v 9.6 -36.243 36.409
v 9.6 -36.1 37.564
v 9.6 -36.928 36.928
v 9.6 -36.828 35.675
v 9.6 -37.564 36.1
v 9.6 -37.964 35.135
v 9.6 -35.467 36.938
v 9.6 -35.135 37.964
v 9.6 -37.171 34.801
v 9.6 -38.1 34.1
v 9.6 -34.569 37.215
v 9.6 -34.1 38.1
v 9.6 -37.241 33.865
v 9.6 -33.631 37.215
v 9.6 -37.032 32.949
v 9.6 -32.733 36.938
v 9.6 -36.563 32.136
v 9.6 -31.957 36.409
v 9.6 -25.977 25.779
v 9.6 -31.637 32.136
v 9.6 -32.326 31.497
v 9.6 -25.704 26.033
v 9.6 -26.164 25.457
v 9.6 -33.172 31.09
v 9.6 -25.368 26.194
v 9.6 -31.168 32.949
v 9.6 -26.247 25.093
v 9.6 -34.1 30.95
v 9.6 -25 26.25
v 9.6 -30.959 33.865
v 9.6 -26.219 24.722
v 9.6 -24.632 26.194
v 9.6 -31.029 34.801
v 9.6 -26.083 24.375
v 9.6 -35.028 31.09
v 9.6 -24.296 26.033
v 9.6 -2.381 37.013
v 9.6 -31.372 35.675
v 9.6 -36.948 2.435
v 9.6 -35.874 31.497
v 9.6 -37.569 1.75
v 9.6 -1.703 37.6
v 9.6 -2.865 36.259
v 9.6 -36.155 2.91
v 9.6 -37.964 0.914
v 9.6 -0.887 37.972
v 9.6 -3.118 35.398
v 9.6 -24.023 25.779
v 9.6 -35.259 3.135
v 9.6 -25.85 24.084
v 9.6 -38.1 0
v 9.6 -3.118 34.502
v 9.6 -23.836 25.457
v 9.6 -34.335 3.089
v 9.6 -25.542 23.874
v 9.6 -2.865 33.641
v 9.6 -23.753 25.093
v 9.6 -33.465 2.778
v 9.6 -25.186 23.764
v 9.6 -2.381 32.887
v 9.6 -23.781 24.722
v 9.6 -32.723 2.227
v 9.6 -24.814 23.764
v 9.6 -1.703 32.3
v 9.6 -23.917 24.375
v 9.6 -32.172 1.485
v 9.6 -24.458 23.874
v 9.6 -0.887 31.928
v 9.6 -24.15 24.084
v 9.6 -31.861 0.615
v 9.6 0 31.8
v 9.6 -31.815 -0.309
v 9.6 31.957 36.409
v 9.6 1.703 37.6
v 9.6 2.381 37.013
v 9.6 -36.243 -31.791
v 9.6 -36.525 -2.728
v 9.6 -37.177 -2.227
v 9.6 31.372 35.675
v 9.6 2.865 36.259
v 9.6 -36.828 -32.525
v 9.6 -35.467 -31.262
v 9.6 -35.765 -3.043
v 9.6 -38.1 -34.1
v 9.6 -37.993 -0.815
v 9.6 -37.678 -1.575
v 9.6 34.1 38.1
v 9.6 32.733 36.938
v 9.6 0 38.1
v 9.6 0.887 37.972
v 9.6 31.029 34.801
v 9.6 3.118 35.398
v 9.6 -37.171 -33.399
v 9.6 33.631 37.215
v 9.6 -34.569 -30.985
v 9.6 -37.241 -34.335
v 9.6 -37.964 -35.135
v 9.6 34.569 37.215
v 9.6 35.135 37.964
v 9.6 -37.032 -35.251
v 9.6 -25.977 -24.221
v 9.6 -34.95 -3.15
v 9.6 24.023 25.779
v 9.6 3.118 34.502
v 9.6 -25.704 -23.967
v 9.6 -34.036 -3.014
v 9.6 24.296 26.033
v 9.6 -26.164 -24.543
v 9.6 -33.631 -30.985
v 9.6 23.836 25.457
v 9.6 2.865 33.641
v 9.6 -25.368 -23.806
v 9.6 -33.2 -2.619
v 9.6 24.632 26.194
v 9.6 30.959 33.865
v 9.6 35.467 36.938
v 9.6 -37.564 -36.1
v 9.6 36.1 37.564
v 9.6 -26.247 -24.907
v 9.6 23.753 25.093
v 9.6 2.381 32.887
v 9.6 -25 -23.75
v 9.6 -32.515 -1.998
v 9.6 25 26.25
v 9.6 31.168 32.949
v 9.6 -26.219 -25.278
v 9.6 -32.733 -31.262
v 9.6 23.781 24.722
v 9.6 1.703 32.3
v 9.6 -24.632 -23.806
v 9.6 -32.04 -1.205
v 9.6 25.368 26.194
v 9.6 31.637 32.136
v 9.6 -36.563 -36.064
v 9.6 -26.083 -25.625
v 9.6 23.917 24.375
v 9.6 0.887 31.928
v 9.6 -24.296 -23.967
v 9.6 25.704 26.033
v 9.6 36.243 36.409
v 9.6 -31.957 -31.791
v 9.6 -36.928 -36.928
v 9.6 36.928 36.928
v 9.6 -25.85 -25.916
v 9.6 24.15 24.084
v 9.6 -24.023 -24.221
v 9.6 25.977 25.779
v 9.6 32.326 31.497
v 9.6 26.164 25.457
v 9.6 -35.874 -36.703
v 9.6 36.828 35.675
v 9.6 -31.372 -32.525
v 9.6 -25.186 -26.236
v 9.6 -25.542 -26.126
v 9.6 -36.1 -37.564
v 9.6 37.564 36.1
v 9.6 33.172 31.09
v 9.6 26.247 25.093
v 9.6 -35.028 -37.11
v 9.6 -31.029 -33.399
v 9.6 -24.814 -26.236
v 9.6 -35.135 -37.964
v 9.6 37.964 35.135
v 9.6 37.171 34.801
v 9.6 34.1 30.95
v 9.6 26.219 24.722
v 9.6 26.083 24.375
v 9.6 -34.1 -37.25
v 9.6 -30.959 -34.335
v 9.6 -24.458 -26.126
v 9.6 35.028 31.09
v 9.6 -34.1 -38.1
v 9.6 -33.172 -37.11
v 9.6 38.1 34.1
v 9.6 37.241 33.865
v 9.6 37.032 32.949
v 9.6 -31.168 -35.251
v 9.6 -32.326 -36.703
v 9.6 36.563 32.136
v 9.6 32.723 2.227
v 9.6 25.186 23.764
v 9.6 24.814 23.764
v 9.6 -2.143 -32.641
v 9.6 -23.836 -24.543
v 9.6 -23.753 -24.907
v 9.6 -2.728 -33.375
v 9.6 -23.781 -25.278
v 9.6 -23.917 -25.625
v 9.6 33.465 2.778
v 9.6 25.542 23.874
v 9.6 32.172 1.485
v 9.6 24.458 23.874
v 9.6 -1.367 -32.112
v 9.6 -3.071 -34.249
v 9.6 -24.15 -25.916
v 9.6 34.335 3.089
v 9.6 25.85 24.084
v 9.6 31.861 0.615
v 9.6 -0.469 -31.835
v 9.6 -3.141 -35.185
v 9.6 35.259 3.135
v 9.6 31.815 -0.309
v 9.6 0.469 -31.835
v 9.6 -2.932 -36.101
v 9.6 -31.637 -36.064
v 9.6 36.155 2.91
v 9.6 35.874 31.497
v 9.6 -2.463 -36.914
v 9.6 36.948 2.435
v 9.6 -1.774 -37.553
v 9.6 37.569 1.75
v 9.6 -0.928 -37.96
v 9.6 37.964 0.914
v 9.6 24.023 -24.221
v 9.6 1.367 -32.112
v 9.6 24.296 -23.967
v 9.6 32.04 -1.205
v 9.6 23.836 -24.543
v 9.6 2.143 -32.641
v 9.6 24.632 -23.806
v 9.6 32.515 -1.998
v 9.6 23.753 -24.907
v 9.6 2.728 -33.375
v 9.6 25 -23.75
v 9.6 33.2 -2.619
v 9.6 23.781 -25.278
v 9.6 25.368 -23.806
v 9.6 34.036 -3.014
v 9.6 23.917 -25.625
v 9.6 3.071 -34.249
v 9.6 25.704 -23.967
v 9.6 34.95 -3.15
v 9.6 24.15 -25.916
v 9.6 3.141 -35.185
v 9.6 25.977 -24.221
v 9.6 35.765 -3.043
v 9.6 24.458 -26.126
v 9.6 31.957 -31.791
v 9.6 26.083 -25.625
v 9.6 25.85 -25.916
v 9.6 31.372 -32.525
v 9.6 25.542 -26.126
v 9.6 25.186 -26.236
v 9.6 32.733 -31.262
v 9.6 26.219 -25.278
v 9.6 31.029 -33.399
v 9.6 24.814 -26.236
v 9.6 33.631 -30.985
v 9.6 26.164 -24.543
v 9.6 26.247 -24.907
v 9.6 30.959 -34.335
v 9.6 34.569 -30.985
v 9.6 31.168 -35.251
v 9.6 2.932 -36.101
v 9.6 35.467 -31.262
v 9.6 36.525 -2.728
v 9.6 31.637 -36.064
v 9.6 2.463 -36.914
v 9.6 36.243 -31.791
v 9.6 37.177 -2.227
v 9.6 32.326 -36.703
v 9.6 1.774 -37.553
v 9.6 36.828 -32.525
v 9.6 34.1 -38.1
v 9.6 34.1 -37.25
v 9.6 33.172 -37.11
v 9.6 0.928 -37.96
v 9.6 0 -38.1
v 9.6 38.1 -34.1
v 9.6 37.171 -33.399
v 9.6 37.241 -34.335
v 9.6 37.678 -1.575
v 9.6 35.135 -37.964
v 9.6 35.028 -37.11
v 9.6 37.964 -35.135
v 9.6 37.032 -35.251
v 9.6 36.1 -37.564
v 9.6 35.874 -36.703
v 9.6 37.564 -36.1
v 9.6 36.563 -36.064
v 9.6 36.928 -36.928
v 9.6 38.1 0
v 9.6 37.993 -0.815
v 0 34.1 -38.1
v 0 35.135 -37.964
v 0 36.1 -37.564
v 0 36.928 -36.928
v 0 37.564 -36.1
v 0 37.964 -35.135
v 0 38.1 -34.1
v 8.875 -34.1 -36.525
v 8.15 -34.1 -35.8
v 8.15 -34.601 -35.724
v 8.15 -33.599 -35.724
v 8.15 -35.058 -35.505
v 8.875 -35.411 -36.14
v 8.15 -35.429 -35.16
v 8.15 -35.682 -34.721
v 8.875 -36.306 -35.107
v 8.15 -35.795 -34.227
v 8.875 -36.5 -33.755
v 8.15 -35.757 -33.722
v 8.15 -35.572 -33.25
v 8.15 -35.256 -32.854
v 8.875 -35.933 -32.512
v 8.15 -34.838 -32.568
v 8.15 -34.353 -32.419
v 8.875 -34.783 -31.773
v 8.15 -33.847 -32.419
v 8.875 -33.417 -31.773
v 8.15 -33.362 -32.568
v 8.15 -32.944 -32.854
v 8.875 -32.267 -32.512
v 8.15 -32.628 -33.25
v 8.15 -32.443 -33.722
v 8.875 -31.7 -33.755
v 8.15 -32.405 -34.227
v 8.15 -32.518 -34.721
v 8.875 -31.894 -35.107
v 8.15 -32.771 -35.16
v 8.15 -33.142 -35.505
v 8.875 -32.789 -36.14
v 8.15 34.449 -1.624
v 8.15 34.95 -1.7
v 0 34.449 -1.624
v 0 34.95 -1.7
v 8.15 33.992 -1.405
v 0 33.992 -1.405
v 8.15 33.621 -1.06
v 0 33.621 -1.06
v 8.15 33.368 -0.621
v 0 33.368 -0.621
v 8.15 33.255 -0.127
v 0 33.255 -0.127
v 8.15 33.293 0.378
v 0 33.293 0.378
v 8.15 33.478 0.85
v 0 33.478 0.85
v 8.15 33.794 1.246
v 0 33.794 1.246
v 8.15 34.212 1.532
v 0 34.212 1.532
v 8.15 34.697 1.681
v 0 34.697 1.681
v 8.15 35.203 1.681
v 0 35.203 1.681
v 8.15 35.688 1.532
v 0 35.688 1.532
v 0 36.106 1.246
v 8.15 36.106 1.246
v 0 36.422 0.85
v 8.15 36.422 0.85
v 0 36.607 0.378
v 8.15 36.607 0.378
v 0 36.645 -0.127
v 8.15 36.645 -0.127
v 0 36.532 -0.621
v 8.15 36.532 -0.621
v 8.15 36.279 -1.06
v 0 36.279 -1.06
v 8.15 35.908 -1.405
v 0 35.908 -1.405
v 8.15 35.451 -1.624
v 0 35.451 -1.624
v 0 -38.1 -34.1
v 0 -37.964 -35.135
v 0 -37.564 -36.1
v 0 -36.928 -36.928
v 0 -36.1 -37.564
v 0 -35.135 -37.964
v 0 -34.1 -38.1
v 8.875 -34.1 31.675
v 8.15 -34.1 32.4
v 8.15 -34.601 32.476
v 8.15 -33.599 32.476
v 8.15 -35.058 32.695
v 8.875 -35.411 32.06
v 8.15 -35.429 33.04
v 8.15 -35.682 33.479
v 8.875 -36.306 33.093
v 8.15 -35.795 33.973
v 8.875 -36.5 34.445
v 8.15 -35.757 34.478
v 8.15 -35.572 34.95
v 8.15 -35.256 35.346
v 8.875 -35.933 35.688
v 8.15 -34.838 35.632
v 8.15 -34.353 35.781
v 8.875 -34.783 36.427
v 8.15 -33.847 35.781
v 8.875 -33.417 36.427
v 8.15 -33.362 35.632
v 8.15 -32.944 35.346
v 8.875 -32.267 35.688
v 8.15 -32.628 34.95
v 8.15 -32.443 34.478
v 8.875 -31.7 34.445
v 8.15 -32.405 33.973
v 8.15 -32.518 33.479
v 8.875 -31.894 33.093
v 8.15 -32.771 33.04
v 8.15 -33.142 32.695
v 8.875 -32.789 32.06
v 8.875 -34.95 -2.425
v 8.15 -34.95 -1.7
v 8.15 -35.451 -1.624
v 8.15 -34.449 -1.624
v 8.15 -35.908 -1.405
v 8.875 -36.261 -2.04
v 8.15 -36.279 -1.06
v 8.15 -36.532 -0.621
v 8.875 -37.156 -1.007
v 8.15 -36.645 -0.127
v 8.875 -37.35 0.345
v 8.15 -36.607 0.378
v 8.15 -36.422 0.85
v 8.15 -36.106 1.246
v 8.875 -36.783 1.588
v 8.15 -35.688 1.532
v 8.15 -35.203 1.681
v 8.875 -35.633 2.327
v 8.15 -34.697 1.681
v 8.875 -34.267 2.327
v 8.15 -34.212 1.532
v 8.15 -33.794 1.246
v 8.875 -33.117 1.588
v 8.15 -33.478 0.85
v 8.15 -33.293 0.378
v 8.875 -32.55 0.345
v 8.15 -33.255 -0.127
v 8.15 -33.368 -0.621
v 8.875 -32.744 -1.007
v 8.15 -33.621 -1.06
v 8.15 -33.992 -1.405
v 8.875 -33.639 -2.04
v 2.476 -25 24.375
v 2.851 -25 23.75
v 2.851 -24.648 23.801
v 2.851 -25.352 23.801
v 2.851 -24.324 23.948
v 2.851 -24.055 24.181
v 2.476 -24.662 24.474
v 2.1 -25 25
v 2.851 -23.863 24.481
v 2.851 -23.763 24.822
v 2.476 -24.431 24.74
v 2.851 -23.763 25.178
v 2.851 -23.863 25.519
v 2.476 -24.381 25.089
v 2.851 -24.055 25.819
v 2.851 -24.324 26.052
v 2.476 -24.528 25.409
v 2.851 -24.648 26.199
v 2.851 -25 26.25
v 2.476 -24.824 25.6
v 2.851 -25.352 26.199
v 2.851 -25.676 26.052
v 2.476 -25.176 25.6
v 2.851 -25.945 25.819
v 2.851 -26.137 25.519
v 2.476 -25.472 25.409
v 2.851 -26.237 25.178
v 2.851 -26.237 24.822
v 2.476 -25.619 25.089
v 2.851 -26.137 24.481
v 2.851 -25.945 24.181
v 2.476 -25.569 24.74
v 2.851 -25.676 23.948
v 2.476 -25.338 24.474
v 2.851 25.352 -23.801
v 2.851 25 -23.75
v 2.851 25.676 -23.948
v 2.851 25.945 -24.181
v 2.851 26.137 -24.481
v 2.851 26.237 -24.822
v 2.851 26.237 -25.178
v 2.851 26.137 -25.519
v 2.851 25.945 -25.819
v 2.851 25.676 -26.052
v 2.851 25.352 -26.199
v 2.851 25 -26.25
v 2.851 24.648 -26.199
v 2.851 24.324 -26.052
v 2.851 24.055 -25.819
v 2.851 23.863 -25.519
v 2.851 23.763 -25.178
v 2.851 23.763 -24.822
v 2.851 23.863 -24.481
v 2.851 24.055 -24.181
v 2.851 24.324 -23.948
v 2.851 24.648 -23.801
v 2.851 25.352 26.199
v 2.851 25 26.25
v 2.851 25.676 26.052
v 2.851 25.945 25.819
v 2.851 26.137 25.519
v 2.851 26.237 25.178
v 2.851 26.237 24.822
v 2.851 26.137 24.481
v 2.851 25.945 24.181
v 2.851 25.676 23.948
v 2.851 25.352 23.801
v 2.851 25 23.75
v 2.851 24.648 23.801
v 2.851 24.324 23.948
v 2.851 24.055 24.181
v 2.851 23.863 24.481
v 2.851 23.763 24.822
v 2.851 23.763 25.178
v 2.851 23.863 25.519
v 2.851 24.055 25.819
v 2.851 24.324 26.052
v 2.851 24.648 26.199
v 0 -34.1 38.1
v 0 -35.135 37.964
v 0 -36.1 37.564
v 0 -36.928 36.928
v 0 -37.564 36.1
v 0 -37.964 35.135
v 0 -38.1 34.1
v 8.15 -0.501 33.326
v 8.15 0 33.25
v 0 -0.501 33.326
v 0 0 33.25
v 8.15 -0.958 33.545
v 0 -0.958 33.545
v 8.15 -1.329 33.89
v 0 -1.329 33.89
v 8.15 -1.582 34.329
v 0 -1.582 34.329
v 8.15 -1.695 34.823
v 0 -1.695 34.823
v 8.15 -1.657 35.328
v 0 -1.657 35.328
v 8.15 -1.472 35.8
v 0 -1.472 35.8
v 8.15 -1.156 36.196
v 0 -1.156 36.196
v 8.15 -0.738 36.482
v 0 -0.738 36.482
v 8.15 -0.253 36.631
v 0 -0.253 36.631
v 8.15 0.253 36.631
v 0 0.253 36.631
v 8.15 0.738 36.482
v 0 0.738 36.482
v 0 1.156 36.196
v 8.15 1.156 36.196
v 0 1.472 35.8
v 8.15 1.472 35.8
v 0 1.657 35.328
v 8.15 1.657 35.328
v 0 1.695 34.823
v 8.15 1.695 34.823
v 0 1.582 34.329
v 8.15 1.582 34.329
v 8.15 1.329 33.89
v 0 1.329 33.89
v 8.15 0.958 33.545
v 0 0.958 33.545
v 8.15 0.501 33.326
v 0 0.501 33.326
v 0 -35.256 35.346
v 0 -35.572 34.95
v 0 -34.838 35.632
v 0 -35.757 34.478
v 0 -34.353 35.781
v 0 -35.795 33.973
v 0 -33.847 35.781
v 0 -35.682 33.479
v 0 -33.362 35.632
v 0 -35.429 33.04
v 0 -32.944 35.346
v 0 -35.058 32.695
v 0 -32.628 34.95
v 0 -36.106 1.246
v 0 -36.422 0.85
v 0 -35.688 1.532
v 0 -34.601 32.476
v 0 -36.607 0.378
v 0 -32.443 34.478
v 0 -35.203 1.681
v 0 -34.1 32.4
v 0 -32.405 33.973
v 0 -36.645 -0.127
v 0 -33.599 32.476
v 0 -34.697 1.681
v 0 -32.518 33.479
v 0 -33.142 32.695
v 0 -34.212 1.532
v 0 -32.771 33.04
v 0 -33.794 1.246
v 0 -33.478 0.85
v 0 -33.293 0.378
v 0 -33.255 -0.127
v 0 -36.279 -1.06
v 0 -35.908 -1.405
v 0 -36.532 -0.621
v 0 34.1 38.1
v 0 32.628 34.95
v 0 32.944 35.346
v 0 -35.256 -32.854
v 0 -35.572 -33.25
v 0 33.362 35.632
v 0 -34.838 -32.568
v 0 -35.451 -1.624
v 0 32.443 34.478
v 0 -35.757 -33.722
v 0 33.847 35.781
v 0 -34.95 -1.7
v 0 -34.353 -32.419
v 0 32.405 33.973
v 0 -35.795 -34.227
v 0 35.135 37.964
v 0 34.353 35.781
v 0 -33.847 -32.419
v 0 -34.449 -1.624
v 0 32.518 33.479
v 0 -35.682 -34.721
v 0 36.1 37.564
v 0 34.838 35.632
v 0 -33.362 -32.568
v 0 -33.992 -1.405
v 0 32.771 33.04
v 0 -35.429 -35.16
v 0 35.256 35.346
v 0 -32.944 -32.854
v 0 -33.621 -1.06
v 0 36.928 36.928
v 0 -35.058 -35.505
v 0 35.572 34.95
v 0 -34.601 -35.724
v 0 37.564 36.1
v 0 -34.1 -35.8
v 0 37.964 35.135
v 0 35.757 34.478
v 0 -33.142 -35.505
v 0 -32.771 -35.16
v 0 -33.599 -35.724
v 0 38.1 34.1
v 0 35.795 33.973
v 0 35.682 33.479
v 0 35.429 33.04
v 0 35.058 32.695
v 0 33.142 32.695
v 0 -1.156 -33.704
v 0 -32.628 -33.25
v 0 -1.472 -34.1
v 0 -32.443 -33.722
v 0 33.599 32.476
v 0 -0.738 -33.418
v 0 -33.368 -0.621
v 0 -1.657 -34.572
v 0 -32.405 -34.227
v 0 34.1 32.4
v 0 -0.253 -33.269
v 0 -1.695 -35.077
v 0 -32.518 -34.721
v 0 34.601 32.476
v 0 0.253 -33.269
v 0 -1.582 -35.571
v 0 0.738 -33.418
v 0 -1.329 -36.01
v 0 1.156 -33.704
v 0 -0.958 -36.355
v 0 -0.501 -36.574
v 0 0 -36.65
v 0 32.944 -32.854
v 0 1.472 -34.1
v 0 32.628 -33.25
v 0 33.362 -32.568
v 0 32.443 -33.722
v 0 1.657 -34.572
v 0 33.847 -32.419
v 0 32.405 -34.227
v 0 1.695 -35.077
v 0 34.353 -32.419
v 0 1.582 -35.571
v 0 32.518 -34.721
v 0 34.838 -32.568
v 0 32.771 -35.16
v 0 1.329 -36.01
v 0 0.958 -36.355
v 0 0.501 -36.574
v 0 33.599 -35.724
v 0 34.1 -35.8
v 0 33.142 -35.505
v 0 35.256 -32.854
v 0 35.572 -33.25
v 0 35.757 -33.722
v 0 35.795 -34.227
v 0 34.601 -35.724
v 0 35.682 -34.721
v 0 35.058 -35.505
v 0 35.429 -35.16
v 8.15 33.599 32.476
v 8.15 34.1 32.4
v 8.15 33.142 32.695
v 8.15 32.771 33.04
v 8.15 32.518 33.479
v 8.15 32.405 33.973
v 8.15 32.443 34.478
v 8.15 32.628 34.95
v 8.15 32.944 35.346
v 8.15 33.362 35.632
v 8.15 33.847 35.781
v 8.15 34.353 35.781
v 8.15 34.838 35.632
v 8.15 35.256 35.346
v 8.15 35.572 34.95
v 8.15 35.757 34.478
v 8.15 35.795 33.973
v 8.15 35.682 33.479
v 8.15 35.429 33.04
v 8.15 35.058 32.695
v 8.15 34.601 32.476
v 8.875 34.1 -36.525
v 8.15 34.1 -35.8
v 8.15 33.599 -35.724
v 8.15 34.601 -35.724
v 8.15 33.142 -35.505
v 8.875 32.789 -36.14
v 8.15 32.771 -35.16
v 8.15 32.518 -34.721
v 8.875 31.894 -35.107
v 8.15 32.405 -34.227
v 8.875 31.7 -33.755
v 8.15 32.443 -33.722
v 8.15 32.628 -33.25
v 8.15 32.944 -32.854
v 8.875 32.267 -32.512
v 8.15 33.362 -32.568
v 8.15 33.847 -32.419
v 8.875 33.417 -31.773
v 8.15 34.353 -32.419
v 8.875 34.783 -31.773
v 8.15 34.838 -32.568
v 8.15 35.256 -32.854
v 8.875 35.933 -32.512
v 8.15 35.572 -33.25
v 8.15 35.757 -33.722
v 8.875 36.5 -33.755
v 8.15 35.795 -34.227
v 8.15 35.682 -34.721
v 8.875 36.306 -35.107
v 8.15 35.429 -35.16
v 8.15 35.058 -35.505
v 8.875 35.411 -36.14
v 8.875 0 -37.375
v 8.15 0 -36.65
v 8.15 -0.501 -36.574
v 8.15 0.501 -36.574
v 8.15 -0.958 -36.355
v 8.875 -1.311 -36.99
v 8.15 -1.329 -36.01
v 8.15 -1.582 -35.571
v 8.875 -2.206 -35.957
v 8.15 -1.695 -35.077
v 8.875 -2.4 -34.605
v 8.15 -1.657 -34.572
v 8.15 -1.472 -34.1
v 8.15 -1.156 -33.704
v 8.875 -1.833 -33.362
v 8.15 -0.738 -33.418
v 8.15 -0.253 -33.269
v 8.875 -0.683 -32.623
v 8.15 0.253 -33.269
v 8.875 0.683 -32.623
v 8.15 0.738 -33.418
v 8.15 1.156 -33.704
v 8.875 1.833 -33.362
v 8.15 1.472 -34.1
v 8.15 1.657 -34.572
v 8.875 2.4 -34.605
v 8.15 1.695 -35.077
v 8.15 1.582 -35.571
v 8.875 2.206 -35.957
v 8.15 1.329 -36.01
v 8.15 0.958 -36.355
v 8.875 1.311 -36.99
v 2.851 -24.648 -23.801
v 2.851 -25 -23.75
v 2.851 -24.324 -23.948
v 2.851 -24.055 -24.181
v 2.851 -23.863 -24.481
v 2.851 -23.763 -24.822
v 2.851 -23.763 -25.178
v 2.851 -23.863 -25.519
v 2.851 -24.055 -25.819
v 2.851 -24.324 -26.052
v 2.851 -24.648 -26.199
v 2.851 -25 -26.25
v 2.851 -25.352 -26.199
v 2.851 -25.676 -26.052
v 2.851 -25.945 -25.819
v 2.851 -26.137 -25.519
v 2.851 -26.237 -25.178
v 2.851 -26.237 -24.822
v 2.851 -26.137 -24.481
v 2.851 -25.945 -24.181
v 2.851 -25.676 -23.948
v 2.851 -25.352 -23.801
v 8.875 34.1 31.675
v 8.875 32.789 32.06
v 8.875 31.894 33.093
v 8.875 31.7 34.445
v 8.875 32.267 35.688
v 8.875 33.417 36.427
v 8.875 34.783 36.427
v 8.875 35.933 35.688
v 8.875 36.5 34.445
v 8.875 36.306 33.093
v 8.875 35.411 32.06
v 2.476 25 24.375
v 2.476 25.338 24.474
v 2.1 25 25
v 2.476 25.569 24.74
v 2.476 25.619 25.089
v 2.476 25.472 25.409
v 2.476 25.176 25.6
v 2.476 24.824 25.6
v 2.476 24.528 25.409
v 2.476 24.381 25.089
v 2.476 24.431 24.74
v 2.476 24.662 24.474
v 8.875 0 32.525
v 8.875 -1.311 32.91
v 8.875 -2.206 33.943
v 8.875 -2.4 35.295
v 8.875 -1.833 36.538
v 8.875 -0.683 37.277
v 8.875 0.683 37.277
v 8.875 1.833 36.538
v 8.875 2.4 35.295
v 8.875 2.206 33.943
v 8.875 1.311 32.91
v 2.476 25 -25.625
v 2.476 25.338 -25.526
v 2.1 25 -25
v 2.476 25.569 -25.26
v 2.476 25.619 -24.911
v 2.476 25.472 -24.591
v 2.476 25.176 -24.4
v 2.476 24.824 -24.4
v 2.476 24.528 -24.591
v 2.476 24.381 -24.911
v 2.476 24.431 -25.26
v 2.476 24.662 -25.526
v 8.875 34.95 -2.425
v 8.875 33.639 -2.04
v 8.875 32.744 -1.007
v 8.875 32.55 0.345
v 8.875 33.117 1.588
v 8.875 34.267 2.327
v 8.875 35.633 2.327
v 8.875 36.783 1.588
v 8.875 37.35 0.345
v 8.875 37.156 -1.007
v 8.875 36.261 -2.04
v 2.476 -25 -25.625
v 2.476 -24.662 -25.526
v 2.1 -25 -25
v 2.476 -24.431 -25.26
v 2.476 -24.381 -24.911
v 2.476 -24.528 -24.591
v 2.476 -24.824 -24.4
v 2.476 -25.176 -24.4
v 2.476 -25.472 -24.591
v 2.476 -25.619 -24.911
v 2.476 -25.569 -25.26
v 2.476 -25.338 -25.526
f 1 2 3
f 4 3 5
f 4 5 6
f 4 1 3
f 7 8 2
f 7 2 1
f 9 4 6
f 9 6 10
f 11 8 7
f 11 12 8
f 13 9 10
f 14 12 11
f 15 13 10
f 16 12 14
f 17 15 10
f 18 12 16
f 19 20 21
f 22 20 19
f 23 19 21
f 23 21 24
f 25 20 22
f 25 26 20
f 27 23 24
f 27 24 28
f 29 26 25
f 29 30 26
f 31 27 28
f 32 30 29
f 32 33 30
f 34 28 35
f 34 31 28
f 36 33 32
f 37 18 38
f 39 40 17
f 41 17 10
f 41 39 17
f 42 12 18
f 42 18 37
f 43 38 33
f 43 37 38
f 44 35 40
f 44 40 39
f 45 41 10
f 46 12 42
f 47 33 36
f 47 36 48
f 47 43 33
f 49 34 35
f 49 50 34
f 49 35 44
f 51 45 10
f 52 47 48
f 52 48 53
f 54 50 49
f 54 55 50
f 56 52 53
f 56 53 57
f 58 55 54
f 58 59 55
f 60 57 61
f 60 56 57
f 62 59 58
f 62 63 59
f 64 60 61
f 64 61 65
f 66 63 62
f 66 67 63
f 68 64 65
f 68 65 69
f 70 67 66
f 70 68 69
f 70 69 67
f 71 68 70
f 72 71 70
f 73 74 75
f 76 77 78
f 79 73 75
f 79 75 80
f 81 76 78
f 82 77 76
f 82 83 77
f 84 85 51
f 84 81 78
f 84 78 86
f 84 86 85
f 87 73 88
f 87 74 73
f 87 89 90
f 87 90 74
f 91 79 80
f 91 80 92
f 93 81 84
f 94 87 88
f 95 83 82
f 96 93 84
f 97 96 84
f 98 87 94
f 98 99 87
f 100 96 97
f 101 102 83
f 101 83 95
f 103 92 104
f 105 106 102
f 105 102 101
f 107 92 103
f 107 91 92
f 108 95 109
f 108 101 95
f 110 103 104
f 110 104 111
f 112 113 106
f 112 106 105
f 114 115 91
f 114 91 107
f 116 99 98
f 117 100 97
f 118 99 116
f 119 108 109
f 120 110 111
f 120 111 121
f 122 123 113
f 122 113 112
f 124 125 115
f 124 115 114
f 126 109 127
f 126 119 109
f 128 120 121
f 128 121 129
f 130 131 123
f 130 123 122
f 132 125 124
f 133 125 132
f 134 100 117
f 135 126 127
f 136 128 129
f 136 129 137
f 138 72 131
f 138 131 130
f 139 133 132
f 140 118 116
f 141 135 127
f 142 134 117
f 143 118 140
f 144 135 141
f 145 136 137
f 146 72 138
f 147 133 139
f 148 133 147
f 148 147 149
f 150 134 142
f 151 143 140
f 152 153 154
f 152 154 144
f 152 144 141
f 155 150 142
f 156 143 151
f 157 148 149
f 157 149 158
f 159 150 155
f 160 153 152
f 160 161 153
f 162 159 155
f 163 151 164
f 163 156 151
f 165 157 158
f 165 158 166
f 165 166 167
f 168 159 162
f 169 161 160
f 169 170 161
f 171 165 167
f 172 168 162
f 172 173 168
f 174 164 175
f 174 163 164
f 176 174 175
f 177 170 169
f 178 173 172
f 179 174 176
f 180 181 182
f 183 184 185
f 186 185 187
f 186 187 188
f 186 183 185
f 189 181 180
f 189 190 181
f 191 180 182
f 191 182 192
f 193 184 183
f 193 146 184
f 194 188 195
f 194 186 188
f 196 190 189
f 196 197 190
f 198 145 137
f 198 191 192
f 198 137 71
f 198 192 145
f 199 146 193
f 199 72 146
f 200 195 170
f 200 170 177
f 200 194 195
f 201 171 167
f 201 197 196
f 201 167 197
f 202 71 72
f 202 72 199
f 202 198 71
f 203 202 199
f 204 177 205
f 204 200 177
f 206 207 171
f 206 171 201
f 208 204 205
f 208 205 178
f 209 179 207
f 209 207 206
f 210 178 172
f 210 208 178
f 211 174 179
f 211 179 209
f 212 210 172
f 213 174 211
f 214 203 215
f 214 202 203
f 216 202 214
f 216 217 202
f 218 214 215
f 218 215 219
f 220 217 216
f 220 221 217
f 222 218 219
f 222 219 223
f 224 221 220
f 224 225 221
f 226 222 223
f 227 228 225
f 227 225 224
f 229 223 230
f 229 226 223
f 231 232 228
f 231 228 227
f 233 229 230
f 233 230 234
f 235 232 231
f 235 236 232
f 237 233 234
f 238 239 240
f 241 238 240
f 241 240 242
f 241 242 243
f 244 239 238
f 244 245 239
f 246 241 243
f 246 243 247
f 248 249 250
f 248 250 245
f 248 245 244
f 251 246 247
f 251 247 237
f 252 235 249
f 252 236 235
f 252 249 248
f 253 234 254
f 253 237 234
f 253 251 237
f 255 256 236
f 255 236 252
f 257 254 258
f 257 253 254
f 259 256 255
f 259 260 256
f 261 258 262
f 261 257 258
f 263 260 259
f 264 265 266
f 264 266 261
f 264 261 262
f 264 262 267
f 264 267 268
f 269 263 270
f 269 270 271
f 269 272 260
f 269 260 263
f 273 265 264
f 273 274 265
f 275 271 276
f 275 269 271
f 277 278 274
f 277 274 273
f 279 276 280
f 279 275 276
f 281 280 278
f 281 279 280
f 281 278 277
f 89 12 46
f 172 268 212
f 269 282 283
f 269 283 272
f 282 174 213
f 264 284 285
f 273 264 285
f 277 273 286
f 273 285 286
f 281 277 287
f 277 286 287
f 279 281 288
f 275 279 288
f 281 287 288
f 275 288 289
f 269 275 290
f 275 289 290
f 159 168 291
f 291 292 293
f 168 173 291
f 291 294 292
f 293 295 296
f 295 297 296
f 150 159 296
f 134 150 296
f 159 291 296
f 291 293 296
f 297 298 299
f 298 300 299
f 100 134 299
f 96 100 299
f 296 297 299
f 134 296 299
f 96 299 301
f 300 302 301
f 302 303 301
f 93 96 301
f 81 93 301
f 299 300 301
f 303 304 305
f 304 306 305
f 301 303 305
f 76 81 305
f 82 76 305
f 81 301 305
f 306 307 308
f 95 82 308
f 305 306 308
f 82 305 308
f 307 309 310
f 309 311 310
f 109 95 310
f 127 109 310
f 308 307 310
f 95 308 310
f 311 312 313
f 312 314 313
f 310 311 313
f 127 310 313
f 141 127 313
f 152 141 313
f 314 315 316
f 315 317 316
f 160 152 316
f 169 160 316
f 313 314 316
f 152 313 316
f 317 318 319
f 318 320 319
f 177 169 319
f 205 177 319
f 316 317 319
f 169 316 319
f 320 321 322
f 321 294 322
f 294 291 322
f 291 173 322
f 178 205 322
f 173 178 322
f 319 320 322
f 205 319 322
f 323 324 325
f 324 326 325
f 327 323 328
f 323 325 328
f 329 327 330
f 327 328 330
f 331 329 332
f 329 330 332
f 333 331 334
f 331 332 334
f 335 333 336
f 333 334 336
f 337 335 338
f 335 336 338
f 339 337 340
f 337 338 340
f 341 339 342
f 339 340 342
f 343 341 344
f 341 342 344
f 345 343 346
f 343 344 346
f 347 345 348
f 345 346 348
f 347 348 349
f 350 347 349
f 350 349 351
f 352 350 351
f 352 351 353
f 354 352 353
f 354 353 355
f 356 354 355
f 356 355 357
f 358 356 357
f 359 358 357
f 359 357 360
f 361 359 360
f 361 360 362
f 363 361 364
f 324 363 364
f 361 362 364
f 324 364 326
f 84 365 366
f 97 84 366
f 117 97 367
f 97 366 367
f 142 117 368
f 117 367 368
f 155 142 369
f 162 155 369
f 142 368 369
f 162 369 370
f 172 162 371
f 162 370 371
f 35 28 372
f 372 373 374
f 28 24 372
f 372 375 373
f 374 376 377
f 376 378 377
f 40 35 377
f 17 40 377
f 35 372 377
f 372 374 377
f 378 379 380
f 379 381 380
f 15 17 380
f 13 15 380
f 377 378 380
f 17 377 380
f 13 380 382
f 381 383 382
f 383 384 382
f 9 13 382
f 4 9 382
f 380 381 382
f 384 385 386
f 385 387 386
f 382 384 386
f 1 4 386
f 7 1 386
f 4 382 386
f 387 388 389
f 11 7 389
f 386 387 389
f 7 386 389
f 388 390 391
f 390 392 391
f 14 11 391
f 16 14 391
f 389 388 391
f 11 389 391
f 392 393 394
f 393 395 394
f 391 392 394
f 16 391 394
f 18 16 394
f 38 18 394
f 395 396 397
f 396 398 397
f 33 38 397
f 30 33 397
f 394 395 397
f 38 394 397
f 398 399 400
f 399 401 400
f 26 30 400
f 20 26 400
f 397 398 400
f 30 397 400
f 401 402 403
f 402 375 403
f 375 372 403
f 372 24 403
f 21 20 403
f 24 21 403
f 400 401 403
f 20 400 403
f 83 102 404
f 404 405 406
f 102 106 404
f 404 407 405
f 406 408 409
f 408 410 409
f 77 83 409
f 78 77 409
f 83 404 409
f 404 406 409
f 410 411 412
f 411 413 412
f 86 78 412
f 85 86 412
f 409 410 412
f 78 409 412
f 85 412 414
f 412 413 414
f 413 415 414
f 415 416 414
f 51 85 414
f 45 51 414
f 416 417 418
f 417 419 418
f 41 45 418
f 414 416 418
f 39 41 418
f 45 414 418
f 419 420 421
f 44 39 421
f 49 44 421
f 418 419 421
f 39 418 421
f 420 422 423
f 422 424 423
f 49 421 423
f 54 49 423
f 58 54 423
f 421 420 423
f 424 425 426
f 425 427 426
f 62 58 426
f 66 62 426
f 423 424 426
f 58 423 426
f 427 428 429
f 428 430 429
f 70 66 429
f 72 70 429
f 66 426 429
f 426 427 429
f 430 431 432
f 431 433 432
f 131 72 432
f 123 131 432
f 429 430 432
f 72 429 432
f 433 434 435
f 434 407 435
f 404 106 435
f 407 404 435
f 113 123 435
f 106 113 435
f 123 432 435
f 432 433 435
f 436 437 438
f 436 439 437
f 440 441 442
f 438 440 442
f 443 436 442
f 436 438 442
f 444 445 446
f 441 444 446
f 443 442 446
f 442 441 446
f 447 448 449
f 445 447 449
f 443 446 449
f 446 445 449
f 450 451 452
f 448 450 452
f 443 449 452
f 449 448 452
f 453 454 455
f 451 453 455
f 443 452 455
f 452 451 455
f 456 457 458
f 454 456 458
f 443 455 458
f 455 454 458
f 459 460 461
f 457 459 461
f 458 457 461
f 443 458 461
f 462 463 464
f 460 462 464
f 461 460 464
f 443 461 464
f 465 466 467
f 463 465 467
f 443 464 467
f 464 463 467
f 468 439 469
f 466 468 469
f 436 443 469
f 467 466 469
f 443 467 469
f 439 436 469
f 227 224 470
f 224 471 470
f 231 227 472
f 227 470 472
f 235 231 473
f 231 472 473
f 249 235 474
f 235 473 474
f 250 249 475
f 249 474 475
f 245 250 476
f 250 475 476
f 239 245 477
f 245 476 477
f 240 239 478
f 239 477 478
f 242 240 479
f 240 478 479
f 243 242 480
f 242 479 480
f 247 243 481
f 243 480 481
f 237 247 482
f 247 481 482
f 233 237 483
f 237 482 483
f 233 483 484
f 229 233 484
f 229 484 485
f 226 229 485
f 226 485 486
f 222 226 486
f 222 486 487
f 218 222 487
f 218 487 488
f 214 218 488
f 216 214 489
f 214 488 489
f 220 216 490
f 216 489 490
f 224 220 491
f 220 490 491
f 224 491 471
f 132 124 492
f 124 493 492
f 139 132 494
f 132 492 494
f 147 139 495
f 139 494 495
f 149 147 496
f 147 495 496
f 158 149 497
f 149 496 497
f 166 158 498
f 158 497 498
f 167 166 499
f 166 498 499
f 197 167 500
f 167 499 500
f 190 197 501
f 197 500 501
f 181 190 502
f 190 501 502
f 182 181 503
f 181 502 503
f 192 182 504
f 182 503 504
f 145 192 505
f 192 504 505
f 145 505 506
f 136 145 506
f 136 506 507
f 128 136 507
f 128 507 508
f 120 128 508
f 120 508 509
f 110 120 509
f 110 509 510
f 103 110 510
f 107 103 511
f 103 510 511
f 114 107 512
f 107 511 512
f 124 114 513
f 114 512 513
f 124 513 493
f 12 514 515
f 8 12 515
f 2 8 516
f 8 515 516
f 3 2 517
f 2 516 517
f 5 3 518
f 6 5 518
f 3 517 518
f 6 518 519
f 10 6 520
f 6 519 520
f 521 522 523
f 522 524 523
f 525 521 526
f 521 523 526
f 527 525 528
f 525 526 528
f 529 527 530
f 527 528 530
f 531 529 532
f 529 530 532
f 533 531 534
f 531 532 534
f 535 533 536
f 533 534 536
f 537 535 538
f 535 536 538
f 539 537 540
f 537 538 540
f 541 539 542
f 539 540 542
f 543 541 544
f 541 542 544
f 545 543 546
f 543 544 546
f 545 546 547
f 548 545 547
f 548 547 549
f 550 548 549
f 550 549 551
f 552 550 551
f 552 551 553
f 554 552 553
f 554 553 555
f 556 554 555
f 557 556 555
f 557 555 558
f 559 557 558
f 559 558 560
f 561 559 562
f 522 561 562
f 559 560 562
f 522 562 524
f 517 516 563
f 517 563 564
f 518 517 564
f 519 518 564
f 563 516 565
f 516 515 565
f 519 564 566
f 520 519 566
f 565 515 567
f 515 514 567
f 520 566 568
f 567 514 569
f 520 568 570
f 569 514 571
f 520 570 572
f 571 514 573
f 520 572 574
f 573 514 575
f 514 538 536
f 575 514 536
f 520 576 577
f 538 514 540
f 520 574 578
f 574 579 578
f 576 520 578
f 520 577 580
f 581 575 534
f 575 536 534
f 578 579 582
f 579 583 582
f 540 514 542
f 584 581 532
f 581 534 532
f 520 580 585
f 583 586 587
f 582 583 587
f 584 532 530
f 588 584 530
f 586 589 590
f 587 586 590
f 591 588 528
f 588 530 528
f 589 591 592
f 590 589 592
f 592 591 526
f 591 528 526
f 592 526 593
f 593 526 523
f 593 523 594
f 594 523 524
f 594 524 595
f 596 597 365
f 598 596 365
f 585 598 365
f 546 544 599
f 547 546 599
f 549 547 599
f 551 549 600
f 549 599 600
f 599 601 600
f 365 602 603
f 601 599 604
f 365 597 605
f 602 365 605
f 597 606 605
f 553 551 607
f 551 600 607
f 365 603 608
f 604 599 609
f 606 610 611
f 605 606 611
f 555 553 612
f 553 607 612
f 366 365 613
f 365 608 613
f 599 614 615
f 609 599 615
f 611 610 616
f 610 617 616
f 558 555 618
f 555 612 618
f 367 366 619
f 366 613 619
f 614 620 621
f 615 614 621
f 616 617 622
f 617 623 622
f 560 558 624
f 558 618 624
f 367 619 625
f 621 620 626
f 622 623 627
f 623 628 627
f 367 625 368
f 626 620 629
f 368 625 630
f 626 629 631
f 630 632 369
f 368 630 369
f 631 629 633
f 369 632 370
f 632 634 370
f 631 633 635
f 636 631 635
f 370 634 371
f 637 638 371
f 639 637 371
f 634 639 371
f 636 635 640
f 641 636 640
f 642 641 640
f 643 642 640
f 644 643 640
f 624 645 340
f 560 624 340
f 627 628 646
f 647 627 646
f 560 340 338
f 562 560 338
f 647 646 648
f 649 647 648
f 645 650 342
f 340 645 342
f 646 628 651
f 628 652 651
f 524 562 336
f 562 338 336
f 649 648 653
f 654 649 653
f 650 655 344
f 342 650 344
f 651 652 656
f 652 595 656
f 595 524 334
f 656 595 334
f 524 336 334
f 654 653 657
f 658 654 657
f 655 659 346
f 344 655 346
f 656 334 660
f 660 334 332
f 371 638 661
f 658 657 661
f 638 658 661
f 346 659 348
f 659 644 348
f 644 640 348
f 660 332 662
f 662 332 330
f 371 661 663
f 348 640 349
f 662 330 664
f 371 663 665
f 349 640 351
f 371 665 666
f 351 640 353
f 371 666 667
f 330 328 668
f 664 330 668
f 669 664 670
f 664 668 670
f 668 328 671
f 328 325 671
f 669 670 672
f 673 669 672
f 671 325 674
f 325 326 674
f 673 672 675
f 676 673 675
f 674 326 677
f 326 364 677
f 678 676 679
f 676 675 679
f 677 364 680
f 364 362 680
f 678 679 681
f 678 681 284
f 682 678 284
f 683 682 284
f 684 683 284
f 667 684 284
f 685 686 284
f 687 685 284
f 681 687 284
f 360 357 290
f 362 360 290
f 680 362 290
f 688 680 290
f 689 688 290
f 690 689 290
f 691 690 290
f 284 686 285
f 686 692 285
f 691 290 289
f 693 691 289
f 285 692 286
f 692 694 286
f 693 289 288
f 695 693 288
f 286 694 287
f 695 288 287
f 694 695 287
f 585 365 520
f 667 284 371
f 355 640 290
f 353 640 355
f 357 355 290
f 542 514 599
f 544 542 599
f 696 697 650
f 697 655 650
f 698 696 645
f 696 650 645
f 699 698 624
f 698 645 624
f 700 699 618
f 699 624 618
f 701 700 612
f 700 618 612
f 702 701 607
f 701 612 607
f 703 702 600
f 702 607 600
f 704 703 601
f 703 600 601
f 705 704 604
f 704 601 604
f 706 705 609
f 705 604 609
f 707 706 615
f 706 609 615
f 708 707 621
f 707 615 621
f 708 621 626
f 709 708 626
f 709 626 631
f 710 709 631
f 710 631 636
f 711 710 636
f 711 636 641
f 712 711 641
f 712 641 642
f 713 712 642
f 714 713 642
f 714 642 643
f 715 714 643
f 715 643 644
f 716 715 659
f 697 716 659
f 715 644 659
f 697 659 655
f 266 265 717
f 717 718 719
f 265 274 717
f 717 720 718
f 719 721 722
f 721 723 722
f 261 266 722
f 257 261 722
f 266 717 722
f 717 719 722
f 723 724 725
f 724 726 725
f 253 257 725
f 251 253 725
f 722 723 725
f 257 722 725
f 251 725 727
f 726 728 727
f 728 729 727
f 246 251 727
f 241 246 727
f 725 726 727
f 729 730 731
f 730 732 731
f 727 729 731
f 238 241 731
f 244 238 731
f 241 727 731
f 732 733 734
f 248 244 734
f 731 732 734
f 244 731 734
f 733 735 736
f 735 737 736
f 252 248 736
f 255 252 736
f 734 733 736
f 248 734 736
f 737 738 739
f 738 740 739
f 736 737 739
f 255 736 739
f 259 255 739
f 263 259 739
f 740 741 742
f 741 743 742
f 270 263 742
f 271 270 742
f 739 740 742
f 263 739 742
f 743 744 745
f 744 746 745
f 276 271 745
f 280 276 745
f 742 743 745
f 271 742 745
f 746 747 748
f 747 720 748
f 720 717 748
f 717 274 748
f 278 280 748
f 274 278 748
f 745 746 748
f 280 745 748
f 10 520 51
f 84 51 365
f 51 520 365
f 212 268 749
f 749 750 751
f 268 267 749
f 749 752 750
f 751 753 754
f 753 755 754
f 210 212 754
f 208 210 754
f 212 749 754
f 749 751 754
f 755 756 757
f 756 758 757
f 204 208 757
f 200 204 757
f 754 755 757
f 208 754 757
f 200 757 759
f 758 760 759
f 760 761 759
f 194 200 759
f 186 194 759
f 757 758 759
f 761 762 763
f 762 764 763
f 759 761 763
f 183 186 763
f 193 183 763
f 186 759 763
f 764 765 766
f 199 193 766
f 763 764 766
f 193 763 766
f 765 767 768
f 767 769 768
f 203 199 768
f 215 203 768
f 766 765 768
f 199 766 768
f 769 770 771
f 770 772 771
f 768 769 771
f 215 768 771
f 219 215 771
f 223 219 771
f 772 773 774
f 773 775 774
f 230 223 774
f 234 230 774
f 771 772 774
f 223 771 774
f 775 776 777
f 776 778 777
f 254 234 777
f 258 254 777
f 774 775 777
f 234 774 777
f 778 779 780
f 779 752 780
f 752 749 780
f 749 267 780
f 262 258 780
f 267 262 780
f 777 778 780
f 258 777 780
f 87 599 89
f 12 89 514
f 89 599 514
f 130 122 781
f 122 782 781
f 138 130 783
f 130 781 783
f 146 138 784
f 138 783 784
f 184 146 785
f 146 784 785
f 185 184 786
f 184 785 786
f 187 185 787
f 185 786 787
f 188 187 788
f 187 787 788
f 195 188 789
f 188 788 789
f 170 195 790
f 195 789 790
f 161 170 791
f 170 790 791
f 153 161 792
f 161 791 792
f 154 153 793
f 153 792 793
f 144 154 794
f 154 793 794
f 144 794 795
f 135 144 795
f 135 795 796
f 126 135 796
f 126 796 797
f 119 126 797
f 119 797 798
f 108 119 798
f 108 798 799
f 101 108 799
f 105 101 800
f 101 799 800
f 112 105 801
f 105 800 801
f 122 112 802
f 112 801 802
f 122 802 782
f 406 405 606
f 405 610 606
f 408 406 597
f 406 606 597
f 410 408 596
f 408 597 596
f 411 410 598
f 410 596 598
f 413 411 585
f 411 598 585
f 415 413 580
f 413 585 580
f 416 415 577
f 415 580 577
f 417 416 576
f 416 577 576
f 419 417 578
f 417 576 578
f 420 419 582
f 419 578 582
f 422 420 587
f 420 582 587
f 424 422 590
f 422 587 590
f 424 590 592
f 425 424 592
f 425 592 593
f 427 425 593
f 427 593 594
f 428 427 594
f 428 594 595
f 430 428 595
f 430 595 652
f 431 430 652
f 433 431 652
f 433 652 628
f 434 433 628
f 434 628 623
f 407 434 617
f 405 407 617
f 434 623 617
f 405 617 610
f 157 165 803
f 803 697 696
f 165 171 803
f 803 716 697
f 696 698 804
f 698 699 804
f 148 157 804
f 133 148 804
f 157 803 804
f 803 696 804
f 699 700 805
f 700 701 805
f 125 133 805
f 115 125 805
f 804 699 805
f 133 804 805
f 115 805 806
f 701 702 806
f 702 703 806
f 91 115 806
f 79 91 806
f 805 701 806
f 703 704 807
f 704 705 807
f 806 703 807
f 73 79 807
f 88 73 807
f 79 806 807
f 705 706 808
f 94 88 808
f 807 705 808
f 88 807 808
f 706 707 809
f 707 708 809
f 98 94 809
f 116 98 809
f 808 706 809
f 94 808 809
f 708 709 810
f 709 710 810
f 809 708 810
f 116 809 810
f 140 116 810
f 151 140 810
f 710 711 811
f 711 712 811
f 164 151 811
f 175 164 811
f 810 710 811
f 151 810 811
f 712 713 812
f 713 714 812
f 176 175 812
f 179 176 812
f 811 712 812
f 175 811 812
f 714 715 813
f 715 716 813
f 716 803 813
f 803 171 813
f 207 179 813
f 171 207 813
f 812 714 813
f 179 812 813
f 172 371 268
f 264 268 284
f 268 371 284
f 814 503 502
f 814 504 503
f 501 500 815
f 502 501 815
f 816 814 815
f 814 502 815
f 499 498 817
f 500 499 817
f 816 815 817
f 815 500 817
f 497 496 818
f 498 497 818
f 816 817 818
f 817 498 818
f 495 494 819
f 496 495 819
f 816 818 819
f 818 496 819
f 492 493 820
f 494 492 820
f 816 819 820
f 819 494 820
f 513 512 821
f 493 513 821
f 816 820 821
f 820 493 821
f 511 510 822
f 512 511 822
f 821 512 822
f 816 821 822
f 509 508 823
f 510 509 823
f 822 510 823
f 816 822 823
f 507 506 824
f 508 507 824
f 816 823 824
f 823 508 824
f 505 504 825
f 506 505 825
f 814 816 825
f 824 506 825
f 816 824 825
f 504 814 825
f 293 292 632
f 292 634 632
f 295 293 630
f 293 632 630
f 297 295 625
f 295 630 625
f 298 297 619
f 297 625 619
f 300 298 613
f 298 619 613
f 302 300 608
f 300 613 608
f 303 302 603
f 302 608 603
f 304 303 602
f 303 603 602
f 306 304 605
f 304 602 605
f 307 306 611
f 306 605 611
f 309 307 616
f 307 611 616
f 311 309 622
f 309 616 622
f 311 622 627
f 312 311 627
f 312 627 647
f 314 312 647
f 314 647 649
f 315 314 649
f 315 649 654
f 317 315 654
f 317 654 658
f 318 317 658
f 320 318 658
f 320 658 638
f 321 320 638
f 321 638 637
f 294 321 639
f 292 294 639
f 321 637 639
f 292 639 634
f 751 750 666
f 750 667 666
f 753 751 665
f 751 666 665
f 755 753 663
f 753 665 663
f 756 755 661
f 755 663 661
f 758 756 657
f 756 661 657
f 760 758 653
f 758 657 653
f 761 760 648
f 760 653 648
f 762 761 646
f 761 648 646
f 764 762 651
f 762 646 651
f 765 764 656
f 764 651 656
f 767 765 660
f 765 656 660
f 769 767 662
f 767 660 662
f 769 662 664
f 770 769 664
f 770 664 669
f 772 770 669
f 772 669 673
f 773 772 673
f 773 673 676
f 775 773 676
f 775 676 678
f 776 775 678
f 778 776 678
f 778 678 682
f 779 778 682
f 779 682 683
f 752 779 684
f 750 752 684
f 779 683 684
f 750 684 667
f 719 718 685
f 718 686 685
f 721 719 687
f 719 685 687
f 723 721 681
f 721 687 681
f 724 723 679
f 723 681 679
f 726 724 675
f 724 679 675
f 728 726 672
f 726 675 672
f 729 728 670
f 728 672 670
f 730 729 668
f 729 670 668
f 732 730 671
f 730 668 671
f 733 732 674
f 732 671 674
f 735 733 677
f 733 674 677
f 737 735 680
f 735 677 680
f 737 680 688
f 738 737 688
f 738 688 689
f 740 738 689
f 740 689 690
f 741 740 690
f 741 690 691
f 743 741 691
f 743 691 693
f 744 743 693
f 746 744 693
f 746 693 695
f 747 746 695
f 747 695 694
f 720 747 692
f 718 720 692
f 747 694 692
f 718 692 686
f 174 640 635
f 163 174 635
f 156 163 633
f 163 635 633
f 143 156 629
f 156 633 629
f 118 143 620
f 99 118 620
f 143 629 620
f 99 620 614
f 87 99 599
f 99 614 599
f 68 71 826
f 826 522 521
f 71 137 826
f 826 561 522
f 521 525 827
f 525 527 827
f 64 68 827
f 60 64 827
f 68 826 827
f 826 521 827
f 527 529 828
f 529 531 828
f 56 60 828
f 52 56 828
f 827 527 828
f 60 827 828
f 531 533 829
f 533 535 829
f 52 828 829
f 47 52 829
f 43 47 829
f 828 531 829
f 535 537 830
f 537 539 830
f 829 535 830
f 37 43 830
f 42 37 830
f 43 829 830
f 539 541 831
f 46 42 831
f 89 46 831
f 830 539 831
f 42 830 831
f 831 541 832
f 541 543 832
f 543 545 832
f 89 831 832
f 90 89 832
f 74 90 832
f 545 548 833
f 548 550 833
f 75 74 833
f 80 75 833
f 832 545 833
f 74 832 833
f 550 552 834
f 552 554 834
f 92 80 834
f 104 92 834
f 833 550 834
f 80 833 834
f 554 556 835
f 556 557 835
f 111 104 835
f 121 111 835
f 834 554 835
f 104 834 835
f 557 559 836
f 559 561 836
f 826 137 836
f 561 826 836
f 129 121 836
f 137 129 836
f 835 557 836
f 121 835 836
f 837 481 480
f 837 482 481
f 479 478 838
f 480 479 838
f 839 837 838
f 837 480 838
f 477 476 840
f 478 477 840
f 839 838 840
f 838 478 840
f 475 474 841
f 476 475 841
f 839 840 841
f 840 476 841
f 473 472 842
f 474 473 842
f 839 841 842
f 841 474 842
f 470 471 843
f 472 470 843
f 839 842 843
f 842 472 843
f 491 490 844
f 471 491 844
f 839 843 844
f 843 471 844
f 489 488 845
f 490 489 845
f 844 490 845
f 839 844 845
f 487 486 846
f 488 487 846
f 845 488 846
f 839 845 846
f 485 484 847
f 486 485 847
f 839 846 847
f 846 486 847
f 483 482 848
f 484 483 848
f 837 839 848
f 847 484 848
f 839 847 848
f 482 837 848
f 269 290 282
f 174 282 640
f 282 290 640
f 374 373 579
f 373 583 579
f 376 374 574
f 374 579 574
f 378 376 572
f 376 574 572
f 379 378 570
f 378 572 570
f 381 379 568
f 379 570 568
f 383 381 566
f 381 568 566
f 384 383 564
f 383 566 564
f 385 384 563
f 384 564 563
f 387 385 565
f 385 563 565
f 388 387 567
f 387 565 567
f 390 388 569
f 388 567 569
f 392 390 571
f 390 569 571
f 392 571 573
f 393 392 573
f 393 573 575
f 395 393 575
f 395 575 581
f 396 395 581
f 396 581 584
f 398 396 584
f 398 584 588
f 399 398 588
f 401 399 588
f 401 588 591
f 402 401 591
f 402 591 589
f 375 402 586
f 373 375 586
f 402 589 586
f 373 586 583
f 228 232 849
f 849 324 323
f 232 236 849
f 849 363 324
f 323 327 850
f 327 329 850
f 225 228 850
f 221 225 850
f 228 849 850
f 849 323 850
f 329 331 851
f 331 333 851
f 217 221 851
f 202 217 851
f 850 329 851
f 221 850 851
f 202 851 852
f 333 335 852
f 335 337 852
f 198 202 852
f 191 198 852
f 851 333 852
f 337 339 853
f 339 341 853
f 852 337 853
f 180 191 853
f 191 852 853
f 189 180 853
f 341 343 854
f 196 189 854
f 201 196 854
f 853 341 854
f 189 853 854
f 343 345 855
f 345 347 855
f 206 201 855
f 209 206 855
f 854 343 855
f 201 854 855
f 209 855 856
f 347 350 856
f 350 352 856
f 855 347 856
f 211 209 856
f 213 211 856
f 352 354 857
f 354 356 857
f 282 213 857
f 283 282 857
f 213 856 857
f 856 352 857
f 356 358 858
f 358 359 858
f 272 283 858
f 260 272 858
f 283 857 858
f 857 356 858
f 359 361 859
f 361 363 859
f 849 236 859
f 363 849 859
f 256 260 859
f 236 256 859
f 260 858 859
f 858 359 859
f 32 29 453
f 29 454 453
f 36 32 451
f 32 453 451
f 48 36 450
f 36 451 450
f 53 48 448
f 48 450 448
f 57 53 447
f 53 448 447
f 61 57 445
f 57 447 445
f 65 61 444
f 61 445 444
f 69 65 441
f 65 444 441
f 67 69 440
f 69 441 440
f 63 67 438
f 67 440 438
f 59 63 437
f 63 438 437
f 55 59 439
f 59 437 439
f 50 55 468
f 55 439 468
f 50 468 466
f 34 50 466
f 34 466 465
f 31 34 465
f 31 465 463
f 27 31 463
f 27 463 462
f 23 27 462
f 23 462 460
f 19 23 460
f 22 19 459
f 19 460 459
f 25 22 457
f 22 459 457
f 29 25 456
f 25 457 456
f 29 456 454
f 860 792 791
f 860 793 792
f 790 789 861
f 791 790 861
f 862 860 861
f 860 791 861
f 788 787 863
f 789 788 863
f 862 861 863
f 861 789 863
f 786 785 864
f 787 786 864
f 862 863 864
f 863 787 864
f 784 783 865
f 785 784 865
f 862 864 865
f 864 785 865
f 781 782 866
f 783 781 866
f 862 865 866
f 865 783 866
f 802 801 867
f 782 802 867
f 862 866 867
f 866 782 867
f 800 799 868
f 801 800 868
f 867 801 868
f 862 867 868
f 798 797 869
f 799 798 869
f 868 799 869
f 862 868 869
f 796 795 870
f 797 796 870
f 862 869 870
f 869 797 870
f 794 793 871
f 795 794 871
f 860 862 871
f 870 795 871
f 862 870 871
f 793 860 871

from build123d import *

# Parameters (mm, degrees)
BOSS_EXTRUDE1_DEPTH                             = 9.6
CSK_FOR_M3_FLAT_HEAD_MACHINE_SCREW1_D           = 3.4
CSK_FOR_M3_FLAT_HEAD_MACHINE_SCREW1_CSINK_D     = 6.3
CSK_FOR_M3_FLAT_HEAD_MACHINE_SCREW1_CSINK_ANGLE = 90
M3X0_5_TAPPED_HOLE1_D                           = 2.5
M3X0_5_TAPPED_HOLE1_DEPTH                       = 6.748924226
M3X0_5_TAPPED_HOLE1_TIP                         = 0.751075774


with BuildPart() as part:
    # Sketch2 → Boss-Extrude1 (new body)
    with BuildSketch(Plane(origin=(0, 0, 0), x_dir=(0, 0, -1), z_dir=(1, 0, 0))):
        with BuildLine():
            Line((-34.1, -38.1), (34.1, -38.1))
            ThreePointArc((34.1, -38.1), (36.928427125, -36.928427125), (38.1, -34.1))
            Line((38.1, -34.1), (38.1, 34.1))
            ThreePointArc((38.1, 34.1), (36.928427125, 36.928427125), (34.1, 38.1))
            Line((34.1, 38.1), (-34.1, 38.1))
            ThreePointArc((-34.1, 38.1), (-36.928427125, 36.928427125), (-38.1, 34.1))
            Line((-38.1, 34.1), (-38.1, -34.1))
            ThreePointArc((-38.1, -34.1), (-36.928427125, -36.928427125), (-34.1, -38.1))
        make_face()
    extrude(amount=BOSS_EXTRUDE1_DEPTH)

    # CSK for M3 Flat Head Machine Screw1 (through all)
    with Locations(Plane(origin=(9.6, 0, 0), x_dir=(0, 0, 1), z_dir=(1, 0, 0))):
        with Locations((-34.100008, -34.1), (34.1, -34.1), (34.1, 34.1), (-34.100008, 34.1), (0, -34.94999995), (34.95, 0), (0, 34.95), (-34.95, 0)):
            CounterSinkHole(CSK_FOR_M3_FLAT_HEAD_MACHINE_SCREW1_D / 2, CSK_FOR_M3_FLAT_HEAD_MACHINE_SCREW1_CSINK_D / 2, counter_sink_angle=CSK_FOR_M3_FLAT_HEAD_MACHINE_SCREW1_CSINK_ANGLE)

    # M3x0.5 Tapped Hole1
    with Locations(Plane(origin=(9.6, 0, 0), x_dir=(0, 0, -1), z_dir=(1, 0, 0))):
        with Locations((-25, 25), (25, 25), (25, -25), (-25, -25)):
            Hole(M3X0_5_TAPPED_HOLE1_D / 2, depth=M3X0_5_TAPPED_HOLE1_DEPTH)
            with Locations((0, 0, -(M3X0_5_TAPPED_HOLE1_DEPTH + M3X0_5_TAPPED_HOLE1_TIP / 2))):  # 118° drill point
                Cone(0, M3X0_5_TAPPED_HOLE1_D / 2, M3X0_5_TAPPED_HOLE1_TIP, mode=Mode.SUBTRACT)


solid = part.part
